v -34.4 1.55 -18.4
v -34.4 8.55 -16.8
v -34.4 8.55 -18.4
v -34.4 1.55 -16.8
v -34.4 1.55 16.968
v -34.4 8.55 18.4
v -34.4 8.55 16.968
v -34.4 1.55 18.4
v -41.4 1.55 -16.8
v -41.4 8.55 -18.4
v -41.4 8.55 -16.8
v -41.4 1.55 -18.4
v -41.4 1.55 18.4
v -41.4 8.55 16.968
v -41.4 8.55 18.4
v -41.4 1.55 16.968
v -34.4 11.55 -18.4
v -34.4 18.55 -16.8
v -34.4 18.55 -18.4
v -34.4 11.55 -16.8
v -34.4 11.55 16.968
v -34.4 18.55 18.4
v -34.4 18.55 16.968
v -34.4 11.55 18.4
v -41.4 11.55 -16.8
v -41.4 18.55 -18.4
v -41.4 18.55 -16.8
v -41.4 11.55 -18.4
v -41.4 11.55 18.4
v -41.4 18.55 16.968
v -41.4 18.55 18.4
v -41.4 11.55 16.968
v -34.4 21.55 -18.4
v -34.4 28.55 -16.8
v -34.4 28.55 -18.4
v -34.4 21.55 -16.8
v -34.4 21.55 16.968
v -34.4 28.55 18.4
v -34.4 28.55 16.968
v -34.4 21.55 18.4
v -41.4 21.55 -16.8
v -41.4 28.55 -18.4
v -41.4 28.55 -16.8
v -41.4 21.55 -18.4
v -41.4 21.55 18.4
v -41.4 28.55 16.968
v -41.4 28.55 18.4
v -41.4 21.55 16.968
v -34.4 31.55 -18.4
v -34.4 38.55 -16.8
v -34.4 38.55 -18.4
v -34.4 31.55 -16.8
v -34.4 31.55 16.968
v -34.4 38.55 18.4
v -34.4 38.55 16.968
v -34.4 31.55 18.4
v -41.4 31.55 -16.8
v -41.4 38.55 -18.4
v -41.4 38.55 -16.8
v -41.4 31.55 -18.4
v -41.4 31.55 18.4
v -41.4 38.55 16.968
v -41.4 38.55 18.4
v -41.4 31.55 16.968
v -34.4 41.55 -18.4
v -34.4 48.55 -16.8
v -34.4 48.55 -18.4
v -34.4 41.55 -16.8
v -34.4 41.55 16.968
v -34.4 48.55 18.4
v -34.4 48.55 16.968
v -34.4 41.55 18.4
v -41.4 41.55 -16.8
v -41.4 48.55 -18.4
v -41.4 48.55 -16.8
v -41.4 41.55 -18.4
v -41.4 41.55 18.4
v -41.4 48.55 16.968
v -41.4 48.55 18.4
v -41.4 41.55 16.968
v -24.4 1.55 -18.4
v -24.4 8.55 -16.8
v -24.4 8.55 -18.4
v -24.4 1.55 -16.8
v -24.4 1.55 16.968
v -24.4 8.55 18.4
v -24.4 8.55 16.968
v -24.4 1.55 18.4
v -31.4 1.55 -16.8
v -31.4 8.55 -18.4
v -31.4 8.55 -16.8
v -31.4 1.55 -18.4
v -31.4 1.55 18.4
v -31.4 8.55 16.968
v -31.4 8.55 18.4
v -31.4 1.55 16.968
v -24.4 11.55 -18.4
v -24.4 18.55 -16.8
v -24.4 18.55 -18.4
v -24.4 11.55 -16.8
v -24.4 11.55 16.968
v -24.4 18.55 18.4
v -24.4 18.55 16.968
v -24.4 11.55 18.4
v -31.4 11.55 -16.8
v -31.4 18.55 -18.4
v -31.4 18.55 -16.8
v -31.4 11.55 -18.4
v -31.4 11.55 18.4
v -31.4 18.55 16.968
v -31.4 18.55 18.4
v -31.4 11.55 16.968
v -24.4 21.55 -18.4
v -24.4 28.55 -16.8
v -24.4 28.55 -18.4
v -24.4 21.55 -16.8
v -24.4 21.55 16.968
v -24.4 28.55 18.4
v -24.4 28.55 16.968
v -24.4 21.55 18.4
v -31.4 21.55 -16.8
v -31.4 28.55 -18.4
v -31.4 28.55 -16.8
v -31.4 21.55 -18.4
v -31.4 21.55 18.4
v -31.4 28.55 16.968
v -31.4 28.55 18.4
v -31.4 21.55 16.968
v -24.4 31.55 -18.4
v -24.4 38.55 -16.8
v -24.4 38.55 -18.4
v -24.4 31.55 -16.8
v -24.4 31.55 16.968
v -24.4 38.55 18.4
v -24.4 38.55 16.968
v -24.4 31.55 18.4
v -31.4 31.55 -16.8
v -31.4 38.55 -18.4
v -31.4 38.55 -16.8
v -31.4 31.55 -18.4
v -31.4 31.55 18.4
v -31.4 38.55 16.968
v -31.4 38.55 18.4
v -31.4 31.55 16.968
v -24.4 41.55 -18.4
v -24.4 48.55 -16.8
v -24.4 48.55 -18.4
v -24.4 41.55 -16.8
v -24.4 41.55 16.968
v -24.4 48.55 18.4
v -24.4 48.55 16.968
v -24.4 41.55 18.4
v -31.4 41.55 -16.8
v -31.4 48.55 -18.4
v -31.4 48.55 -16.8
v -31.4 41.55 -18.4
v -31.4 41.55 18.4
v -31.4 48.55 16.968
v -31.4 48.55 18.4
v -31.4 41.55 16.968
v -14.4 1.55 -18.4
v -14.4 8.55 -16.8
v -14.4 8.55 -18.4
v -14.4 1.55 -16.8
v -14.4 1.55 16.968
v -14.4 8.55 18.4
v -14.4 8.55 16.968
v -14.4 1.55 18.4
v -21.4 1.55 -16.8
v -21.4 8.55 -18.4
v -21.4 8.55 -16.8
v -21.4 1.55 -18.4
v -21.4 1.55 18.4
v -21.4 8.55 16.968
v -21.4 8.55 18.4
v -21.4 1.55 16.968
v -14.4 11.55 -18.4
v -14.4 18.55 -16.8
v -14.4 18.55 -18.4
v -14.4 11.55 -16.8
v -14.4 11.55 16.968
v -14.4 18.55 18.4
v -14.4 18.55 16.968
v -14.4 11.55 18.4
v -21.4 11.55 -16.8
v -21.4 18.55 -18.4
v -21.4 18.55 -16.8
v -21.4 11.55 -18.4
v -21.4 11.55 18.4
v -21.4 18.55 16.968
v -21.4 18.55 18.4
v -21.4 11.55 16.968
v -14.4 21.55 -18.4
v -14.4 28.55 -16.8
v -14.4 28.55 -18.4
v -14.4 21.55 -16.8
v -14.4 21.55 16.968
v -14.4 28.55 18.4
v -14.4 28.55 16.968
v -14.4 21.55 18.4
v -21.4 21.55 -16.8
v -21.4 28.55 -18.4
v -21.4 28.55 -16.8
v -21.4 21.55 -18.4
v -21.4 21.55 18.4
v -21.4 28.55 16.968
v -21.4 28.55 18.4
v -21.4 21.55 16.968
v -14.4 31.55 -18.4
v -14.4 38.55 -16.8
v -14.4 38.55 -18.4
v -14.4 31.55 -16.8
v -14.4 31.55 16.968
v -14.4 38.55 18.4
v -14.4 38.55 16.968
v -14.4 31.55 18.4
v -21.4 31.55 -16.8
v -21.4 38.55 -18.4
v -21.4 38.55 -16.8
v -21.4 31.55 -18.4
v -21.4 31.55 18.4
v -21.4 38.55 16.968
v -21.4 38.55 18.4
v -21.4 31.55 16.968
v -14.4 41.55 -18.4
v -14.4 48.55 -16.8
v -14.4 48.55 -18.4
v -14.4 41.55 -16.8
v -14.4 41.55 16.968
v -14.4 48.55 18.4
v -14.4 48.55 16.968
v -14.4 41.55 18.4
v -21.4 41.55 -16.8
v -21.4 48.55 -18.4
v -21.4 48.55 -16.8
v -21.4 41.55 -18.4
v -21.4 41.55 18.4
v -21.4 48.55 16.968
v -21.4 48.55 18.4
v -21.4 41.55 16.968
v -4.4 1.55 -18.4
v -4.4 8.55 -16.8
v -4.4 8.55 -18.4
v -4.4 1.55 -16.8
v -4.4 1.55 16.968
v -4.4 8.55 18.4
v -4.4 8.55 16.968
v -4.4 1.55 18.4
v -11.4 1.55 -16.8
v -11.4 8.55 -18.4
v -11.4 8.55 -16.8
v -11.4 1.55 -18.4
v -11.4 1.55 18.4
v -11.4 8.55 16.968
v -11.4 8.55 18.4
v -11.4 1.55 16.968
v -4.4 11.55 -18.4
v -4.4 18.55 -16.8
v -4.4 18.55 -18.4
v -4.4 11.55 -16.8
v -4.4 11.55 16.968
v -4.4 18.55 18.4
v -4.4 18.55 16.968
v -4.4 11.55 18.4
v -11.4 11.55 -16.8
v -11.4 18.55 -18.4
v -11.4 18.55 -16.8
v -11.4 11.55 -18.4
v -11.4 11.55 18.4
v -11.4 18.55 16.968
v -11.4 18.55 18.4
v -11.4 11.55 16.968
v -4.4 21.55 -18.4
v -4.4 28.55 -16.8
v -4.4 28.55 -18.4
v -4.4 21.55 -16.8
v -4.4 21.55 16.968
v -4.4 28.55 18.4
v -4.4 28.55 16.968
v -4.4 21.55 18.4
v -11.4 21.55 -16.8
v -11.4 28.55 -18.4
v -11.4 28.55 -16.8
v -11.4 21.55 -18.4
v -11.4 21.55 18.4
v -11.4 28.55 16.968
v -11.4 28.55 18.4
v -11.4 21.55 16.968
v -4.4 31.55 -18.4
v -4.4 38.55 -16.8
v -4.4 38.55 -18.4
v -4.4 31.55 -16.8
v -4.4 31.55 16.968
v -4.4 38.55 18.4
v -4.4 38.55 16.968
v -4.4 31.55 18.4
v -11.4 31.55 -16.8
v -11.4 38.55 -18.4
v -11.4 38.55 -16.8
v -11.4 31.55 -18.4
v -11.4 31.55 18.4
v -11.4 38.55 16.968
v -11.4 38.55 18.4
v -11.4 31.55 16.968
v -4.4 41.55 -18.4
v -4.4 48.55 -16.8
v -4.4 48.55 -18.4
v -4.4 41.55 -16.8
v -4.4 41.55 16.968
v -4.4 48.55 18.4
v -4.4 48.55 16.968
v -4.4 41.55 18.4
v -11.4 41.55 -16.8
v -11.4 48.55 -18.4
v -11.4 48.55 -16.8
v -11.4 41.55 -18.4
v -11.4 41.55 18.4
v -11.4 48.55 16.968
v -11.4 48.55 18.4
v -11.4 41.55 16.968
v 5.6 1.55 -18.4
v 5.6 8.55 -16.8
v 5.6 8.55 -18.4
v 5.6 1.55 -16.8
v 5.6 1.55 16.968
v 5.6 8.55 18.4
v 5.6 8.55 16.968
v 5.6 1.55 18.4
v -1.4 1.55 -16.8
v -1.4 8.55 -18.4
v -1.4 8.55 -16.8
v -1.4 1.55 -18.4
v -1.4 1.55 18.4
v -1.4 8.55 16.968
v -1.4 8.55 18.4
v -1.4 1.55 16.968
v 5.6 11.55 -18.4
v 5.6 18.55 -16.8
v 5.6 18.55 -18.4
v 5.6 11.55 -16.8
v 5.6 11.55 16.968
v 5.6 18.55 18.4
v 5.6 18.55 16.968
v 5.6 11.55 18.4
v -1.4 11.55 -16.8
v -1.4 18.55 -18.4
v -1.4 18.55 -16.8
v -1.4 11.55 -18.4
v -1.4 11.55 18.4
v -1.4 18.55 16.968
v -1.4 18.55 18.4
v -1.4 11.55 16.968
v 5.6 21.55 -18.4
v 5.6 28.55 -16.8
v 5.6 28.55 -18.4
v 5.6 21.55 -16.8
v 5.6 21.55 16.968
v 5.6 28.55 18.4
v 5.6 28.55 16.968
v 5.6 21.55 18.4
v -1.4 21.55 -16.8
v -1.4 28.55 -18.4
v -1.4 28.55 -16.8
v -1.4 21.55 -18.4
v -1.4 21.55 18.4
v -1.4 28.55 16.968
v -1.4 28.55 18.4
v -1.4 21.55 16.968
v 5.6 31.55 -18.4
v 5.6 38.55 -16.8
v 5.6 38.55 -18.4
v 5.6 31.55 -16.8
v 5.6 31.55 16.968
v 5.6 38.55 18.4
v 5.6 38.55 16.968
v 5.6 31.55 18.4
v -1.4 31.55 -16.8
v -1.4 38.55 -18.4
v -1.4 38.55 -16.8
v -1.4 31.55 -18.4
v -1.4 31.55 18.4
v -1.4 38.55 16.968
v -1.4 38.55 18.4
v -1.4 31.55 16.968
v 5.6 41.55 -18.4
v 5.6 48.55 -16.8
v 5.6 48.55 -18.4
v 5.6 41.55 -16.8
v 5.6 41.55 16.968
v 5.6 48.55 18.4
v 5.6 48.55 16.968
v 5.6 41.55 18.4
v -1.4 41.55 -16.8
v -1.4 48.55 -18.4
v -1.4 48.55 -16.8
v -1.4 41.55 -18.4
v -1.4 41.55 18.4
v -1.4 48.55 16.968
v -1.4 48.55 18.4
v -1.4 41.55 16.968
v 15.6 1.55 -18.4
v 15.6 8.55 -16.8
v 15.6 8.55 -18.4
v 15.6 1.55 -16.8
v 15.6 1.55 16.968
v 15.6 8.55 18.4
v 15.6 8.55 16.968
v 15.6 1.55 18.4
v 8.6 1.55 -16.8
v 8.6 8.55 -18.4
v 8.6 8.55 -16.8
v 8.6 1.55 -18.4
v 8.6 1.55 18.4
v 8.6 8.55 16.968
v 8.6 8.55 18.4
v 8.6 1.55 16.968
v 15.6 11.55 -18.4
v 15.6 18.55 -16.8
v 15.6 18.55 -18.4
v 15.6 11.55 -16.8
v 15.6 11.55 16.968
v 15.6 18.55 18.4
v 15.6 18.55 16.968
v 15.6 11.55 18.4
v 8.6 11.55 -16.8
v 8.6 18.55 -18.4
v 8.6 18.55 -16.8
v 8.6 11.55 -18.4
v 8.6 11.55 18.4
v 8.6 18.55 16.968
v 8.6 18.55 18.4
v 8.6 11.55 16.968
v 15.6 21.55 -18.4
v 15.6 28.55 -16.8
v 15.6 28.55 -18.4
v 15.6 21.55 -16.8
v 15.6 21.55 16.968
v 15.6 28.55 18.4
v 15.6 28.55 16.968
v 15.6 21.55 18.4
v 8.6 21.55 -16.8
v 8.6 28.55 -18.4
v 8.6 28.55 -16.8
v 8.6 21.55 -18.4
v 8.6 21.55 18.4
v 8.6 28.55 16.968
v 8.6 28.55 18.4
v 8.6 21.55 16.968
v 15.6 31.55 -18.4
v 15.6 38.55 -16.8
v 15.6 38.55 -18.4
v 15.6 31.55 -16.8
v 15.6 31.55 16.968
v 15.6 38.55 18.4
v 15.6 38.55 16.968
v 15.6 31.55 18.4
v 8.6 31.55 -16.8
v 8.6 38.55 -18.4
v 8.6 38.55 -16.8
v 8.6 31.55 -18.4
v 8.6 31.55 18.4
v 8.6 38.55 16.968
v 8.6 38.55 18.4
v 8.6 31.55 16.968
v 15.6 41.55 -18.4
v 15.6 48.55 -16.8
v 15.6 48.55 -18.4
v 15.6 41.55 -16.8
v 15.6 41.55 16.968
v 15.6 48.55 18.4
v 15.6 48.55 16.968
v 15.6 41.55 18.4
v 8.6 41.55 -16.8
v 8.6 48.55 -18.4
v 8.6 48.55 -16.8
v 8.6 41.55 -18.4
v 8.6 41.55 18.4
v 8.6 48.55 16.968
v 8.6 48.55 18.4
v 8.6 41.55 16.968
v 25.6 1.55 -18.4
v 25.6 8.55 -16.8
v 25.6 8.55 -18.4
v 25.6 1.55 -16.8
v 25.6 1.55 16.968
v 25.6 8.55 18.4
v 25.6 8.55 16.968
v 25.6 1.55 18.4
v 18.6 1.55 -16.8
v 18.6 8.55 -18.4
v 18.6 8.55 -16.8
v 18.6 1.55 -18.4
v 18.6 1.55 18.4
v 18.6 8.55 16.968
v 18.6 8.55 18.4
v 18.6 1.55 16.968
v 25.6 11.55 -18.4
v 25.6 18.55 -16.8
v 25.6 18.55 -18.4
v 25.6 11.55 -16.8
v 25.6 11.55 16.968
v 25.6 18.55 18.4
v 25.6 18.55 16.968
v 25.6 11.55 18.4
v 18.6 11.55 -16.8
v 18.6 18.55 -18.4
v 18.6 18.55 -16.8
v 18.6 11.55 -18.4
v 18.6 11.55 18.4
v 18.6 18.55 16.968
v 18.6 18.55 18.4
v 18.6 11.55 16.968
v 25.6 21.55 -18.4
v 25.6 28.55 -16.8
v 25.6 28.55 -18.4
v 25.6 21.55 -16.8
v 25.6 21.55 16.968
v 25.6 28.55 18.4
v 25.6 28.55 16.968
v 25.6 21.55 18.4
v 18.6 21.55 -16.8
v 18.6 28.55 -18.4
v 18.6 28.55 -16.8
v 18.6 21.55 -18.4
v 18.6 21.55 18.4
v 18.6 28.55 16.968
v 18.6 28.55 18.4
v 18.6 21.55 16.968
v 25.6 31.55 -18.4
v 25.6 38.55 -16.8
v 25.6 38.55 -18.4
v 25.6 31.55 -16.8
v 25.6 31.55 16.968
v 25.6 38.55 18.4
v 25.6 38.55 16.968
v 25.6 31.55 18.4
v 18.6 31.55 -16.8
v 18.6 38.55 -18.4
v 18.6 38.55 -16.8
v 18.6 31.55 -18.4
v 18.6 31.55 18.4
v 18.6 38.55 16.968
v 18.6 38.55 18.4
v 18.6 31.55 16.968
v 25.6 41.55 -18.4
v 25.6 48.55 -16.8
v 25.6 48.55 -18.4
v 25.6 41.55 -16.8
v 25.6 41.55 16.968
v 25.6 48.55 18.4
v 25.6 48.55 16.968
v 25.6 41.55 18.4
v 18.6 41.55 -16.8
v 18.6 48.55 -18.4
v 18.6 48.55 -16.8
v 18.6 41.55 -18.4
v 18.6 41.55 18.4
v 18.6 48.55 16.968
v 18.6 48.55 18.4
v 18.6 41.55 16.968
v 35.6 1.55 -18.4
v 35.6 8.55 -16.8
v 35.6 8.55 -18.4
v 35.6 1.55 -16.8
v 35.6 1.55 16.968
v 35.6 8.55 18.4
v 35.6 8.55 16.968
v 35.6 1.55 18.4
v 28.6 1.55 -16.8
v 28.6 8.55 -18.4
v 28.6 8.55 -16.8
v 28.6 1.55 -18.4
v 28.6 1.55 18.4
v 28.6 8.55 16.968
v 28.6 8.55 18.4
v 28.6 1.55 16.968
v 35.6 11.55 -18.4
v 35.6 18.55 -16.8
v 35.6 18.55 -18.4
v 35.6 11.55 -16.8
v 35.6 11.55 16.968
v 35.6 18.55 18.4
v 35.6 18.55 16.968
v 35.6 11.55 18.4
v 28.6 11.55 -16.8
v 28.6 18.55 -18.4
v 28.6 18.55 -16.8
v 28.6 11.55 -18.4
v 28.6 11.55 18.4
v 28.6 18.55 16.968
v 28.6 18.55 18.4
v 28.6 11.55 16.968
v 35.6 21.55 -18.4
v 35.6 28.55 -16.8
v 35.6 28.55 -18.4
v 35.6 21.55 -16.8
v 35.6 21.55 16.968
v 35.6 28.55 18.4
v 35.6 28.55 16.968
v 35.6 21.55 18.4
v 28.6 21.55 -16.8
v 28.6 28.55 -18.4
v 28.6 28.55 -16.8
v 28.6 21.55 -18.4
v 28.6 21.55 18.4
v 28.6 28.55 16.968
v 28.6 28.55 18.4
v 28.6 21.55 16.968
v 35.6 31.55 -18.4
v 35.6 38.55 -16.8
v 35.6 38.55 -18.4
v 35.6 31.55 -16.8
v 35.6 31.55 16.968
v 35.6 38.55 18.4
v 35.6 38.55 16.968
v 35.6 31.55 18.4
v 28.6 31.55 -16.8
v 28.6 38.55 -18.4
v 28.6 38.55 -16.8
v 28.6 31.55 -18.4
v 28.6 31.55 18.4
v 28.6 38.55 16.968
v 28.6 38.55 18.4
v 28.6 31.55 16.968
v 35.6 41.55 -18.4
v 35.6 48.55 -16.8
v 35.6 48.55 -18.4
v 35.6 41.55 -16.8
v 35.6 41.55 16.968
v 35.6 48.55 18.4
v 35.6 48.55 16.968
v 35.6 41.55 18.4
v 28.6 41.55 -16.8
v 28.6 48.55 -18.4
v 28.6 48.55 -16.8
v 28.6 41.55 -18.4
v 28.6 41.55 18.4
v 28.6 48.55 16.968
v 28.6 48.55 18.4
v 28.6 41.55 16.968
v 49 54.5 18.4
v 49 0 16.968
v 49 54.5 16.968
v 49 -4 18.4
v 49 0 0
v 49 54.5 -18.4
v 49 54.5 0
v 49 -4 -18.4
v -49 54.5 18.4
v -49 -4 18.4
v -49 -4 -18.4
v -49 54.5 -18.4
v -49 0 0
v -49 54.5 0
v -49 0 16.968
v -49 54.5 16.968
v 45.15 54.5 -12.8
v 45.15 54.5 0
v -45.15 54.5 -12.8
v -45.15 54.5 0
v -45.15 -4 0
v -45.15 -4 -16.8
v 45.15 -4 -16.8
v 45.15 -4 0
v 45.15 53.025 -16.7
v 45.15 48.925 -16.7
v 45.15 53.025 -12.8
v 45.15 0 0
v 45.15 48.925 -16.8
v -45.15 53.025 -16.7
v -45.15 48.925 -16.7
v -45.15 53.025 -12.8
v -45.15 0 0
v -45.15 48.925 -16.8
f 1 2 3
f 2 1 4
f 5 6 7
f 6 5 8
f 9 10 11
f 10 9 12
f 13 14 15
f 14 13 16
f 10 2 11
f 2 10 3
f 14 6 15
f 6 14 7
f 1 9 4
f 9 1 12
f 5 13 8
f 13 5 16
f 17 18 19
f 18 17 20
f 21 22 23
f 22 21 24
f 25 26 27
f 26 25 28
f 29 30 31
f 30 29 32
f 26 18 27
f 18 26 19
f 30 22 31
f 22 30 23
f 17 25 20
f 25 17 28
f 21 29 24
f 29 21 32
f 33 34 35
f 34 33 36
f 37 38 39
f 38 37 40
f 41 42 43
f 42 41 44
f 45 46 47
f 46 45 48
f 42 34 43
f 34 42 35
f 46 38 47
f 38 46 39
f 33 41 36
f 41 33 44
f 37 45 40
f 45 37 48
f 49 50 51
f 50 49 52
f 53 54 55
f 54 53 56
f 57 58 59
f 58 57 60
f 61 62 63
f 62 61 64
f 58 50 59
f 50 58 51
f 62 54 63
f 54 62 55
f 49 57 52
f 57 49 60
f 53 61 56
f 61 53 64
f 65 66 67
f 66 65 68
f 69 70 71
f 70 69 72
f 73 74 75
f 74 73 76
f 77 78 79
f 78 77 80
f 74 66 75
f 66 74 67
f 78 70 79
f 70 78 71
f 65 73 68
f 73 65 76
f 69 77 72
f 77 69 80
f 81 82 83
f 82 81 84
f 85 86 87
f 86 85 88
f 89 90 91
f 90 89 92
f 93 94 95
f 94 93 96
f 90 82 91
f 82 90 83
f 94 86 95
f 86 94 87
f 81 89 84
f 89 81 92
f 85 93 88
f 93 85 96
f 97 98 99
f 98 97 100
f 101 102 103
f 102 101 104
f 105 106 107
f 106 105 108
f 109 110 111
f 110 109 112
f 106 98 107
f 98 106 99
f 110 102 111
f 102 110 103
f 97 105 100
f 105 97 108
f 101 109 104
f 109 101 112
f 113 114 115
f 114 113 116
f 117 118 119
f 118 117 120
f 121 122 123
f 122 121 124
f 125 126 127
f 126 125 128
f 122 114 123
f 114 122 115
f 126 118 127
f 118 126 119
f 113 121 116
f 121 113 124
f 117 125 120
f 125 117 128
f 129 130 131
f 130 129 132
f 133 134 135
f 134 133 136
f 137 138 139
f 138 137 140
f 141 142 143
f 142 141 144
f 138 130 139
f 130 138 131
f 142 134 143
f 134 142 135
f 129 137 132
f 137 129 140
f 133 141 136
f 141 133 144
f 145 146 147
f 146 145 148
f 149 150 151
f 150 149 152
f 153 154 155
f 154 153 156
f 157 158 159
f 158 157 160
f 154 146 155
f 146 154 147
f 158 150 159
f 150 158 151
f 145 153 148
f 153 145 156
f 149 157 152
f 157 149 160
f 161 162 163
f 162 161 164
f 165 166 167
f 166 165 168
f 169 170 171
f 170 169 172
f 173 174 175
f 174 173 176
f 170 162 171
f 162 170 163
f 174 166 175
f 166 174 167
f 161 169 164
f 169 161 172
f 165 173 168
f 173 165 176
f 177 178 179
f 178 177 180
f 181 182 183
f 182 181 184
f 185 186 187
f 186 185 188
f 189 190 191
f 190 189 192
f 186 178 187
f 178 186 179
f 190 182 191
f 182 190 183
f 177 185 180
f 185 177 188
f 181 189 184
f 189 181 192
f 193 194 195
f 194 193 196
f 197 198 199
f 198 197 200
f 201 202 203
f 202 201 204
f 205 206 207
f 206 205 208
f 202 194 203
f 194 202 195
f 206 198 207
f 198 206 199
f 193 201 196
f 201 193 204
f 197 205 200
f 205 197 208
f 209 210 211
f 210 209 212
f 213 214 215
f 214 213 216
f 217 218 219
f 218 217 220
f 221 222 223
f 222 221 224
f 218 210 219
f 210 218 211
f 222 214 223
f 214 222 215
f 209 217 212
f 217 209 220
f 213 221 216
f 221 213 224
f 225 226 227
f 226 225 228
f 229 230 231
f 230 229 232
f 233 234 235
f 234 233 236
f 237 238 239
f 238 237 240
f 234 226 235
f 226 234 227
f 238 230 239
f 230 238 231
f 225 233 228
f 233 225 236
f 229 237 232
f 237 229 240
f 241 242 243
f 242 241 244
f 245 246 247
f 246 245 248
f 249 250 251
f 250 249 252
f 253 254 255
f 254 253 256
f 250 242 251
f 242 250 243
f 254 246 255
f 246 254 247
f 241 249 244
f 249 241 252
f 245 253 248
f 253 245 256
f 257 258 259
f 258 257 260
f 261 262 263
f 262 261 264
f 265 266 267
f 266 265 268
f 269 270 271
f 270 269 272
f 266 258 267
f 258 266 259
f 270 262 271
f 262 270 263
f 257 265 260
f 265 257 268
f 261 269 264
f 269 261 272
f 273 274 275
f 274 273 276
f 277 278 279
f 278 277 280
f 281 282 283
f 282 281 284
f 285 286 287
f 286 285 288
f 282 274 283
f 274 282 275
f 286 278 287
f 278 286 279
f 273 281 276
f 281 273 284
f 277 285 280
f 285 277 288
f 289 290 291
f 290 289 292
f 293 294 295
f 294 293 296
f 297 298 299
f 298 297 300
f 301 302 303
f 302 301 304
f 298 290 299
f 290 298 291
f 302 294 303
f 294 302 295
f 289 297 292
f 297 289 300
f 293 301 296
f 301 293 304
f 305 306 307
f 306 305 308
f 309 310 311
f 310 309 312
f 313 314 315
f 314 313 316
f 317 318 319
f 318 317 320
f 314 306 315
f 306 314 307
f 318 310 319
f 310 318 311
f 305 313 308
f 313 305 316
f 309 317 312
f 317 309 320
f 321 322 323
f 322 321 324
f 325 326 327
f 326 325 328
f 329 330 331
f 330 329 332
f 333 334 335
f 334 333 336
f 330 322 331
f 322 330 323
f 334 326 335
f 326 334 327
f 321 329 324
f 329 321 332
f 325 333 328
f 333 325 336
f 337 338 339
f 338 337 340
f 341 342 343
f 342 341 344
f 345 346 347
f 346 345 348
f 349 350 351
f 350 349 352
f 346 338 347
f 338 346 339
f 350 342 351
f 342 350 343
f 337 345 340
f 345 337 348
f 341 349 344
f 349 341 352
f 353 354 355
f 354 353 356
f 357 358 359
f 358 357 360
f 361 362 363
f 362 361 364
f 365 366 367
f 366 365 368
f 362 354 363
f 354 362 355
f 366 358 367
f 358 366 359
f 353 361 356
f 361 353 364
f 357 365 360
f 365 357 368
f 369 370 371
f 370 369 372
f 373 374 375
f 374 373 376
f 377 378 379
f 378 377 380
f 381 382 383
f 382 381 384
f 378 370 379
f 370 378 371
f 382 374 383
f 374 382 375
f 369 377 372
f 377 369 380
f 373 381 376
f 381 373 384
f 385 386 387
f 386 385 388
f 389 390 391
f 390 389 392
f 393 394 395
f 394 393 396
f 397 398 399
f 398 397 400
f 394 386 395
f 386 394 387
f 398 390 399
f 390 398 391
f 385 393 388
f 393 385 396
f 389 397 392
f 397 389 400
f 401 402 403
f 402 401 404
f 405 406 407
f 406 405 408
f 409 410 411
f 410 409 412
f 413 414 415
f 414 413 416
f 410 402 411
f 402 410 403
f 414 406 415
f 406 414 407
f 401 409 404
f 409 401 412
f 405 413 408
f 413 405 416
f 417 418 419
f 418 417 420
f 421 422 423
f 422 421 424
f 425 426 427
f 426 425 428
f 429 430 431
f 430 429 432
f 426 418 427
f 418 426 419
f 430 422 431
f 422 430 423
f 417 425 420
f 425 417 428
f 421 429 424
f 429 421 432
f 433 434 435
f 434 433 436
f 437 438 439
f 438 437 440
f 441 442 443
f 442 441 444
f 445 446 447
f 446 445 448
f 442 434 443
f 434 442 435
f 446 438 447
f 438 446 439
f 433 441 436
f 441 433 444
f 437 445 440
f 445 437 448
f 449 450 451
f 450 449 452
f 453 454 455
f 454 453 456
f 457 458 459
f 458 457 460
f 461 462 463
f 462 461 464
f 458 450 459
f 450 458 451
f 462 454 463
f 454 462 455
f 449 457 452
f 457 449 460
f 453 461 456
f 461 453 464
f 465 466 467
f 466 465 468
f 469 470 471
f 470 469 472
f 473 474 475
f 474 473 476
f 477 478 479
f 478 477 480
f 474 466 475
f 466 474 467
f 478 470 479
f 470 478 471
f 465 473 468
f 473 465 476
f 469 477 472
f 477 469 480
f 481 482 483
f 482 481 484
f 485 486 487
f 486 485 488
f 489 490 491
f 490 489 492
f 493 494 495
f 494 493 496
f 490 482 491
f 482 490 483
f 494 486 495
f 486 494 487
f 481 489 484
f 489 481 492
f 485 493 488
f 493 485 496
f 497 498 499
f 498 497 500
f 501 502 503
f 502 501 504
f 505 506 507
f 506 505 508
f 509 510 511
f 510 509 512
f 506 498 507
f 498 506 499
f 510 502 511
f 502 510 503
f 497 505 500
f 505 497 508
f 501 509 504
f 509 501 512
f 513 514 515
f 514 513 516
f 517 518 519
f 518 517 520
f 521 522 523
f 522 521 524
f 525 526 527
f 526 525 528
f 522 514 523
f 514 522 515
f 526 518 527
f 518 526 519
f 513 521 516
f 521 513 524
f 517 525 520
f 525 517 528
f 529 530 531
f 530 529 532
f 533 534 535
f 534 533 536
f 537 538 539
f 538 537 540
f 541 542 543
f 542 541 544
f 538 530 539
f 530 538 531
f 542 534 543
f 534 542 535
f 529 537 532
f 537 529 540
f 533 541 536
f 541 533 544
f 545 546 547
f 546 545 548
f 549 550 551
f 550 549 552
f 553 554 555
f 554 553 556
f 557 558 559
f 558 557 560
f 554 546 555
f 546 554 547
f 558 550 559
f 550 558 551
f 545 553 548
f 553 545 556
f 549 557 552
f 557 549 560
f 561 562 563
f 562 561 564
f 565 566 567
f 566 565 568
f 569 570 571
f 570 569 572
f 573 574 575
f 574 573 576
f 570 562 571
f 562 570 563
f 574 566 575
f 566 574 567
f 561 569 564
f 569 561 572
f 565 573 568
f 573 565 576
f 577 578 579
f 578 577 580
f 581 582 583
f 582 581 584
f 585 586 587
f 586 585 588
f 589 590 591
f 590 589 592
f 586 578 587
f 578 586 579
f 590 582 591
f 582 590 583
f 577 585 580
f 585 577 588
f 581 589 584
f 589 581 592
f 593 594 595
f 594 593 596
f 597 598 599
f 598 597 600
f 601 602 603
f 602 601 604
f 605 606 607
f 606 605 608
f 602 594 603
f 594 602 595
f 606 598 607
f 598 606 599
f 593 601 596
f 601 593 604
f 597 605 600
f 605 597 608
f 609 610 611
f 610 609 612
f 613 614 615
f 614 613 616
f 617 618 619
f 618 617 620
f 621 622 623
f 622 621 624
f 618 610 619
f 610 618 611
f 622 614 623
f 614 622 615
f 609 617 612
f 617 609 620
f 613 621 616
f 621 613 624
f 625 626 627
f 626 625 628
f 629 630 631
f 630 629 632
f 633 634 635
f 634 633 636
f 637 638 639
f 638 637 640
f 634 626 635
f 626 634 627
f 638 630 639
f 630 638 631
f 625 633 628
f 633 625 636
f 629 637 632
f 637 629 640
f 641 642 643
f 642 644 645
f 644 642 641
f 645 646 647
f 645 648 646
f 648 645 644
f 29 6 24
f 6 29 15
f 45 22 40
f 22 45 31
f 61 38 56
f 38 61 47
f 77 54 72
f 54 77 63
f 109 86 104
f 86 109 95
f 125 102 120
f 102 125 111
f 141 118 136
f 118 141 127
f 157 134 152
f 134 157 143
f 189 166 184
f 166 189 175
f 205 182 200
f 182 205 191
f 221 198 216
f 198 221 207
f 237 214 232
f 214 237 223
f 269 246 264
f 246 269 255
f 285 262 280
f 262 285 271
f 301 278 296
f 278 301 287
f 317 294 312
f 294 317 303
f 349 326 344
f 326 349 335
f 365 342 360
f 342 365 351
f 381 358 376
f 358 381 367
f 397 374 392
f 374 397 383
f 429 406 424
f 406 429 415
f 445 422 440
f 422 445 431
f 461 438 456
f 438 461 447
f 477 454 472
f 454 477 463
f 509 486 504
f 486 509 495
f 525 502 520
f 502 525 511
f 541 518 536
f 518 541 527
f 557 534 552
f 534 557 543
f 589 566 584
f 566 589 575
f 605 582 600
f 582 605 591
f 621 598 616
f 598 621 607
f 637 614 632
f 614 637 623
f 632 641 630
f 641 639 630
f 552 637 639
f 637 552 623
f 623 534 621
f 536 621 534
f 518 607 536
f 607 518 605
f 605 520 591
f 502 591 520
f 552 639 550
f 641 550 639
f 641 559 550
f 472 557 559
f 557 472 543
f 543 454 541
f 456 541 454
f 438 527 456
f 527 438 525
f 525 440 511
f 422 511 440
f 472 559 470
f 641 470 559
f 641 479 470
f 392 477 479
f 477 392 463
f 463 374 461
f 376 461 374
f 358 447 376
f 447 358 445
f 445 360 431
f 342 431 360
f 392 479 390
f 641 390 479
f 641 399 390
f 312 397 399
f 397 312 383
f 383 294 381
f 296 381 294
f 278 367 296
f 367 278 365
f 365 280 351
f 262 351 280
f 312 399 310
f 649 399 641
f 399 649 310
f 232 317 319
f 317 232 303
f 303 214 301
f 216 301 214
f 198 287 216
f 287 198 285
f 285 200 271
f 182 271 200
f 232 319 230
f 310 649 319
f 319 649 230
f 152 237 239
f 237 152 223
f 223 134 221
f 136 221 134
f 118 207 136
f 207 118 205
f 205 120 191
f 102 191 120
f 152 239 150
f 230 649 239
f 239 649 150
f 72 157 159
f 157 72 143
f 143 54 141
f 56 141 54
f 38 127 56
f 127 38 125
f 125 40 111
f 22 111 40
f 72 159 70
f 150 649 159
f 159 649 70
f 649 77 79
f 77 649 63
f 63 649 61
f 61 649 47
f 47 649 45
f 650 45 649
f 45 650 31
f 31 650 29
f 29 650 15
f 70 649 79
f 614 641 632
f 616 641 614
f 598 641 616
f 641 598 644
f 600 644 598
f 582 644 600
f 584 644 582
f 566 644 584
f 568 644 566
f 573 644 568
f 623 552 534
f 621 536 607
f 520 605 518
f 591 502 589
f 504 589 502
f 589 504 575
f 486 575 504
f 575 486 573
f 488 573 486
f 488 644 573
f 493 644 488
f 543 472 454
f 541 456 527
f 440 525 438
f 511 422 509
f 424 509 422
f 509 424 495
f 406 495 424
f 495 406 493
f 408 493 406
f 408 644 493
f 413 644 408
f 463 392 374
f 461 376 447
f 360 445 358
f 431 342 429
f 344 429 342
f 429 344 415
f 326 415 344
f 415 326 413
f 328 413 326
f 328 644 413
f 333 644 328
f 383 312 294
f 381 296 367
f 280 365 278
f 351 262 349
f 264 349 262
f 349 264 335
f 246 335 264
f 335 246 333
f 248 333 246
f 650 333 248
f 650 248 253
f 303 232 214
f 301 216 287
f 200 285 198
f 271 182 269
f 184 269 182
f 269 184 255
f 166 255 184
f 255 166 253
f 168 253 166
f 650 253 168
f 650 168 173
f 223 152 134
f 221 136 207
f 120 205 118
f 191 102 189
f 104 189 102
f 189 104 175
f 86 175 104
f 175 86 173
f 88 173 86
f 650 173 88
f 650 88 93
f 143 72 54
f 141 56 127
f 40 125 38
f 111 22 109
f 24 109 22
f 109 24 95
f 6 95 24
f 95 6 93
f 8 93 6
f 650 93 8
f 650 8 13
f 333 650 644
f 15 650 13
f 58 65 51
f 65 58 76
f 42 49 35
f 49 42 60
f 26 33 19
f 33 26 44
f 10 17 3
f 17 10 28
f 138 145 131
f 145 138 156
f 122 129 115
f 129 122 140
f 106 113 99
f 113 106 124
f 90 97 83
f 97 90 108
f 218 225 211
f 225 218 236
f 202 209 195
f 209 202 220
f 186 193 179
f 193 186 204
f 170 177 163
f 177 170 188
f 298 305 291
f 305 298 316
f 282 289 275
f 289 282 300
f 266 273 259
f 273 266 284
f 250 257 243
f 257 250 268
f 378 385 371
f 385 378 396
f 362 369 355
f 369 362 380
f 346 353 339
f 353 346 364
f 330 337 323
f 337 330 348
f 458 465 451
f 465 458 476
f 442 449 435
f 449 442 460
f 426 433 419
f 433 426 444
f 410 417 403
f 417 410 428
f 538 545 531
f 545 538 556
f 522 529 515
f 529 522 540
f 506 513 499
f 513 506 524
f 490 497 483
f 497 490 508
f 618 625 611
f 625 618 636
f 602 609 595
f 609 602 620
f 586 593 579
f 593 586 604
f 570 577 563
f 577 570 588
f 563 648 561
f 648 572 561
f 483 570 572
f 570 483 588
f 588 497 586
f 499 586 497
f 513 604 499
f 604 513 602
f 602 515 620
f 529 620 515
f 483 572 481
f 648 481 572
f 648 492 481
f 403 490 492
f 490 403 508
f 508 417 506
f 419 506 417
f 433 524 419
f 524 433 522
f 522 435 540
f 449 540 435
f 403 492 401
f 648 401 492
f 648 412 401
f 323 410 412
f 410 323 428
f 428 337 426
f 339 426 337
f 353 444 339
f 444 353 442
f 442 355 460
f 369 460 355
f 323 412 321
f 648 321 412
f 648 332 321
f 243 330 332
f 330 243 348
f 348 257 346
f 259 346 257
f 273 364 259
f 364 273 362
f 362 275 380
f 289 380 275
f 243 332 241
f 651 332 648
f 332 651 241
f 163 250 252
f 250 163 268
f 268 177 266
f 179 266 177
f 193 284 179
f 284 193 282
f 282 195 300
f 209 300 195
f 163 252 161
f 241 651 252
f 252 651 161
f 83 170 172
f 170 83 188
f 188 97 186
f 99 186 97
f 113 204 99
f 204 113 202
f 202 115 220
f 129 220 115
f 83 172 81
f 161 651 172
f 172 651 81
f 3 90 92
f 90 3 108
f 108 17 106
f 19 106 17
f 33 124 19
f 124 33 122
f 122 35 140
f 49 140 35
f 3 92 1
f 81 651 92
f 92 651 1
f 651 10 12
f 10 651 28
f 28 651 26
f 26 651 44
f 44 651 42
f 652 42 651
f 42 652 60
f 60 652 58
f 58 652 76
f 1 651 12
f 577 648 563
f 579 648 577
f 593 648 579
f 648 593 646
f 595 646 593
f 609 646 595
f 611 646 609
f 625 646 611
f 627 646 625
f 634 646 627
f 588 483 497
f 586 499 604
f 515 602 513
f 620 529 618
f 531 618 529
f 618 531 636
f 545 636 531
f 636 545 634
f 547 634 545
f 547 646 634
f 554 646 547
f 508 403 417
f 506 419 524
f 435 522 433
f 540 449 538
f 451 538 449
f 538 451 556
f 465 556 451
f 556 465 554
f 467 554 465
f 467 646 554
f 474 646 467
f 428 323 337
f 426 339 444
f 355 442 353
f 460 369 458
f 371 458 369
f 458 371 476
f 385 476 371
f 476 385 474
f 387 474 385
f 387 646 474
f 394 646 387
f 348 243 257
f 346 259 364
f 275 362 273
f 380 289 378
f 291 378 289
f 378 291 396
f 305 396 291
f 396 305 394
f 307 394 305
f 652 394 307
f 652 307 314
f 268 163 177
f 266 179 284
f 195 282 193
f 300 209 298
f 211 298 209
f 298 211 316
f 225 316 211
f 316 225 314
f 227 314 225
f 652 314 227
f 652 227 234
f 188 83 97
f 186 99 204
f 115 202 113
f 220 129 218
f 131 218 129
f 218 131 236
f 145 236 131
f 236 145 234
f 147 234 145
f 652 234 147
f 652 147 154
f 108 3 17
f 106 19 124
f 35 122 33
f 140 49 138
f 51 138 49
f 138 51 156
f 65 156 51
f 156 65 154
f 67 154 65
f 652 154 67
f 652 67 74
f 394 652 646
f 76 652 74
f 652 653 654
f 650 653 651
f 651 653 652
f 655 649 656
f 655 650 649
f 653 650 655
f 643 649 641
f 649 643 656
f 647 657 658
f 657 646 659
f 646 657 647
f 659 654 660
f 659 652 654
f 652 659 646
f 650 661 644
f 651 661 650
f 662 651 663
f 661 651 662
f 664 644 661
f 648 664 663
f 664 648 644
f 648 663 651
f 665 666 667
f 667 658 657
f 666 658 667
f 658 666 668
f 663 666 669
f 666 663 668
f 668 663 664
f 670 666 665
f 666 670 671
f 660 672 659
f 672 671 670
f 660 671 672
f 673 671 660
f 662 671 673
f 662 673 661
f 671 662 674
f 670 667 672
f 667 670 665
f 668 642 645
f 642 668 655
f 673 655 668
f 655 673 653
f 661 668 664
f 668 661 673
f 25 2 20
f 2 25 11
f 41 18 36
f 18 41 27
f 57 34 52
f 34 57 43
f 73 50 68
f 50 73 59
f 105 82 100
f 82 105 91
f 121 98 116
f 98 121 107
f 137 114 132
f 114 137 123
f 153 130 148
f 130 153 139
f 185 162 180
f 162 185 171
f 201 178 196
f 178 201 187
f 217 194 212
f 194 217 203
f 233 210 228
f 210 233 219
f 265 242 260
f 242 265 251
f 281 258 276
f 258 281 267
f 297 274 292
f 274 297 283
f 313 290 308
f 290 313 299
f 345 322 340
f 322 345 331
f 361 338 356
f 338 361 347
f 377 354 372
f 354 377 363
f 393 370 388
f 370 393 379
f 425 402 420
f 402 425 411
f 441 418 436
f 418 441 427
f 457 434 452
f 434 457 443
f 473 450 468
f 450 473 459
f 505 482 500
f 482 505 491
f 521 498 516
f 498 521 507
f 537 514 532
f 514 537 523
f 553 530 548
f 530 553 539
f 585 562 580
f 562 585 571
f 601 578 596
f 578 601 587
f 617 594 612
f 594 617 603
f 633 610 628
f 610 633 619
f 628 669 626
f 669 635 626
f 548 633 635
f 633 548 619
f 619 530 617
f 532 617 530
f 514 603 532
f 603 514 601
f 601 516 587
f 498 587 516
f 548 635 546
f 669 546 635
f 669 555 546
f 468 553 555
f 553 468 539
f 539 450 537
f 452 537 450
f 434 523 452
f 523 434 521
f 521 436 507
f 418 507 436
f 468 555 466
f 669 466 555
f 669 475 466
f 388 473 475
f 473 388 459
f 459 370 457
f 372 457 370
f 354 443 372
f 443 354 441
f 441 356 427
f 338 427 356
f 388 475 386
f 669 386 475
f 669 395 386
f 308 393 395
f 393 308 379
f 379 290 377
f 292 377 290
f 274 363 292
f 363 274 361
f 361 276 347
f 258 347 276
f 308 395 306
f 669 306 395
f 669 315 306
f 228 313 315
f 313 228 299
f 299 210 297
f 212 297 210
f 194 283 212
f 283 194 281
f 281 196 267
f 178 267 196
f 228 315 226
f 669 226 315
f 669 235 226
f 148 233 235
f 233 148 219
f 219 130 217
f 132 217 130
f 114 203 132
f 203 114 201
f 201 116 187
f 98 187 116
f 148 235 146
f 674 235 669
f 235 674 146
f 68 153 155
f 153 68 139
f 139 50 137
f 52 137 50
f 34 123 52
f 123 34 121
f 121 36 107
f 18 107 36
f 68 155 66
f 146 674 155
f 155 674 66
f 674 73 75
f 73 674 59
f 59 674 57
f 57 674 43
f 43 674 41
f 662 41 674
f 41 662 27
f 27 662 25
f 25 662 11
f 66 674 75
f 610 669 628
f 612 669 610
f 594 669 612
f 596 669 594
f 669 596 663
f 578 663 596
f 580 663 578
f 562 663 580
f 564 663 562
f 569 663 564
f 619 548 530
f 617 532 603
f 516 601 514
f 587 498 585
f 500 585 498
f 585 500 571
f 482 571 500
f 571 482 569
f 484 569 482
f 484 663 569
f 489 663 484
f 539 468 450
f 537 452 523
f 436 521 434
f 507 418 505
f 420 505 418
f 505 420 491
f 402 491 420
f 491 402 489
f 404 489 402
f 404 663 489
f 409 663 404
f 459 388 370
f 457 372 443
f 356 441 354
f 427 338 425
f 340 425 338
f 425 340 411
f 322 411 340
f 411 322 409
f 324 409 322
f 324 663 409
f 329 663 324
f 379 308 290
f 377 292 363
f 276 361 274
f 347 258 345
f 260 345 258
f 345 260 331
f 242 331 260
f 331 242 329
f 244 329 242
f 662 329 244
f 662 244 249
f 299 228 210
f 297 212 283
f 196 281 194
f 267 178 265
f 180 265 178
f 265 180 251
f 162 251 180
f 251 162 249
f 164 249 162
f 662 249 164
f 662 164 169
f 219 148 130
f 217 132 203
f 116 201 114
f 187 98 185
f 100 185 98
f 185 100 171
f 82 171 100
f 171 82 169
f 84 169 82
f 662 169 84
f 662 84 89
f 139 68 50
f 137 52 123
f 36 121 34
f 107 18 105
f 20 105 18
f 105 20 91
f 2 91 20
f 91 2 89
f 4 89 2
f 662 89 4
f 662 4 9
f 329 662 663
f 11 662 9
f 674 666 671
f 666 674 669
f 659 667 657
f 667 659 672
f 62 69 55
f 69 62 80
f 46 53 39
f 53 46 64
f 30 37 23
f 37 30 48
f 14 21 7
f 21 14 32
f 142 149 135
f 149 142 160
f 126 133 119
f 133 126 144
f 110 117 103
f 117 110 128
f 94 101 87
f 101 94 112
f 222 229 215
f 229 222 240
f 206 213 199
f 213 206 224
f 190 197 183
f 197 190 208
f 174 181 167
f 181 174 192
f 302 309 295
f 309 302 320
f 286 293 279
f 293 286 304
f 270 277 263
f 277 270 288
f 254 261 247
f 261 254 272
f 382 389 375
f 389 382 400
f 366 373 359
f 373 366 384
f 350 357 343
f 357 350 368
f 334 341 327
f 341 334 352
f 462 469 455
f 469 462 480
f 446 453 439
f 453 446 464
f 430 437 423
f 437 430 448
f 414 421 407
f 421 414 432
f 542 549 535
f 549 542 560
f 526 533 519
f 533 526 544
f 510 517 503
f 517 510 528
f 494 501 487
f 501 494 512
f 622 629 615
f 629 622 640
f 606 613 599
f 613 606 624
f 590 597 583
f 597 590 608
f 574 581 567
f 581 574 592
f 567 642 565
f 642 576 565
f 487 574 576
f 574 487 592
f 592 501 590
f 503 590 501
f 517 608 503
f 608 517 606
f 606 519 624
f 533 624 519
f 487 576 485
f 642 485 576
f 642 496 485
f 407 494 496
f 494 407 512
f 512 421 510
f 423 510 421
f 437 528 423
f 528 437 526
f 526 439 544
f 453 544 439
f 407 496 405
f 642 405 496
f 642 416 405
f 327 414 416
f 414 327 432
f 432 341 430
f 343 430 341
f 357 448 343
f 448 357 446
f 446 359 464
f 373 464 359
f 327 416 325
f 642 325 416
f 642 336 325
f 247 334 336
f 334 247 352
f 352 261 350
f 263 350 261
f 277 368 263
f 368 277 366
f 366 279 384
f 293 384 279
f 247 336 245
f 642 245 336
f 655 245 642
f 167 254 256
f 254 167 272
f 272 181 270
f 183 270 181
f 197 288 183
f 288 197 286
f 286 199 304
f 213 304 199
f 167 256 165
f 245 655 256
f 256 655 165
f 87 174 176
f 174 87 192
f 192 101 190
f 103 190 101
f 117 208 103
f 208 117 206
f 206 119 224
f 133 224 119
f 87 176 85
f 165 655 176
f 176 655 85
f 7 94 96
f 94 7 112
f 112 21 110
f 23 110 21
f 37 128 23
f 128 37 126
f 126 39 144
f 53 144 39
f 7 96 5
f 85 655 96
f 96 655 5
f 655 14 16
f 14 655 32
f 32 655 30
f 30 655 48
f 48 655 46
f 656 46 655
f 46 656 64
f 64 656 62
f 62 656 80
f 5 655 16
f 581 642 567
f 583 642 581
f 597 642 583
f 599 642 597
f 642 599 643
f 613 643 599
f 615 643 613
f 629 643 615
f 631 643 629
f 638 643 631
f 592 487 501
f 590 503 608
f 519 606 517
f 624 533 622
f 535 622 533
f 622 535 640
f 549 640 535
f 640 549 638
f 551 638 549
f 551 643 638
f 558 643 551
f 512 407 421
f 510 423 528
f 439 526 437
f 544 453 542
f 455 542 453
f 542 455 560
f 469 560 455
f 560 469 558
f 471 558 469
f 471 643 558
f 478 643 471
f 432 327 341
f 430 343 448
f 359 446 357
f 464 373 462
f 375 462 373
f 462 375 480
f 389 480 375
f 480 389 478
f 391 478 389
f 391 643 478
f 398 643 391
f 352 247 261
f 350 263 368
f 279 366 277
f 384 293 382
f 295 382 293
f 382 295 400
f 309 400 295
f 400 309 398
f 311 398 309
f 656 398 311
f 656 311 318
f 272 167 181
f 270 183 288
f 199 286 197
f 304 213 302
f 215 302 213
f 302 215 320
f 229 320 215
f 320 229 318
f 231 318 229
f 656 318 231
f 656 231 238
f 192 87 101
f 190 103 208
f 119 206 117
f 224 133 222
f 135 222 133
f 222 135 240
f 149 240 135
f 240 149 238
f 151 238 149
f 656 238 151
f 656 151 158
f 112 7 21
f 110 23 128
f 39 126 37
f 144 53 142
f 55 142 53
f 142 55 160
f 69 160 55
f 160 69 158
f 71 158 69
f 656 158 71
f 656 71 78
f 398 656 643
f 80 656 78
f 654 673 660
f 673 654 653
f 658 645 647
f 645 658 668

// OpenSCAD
// Height of the Card Reader
Card_Reader_Height = 16;

// Width of the Card Reader
Card_Reader_Width = 86;

// Depth of the Card Reader
Card_Reader_Depth = 50.5;

// Thickness of the Table
Table_Thickness = 16.8;

// How thick should the bracket be
Bracket_Thickness = 2;

// How much wider than the card reader should the bracket be
Bracket_Extra_Width = 6;

// How much deeper than the card reader should the bracket be
Bracket_Extra_Depth = 4;

module CardReaderHolder(
    crHeight=Card_Reader_Height,
    crWidth=Card_Reader_Width,
    crDepth=Card_Reader_Depth,
    tableThickness = Table_Thickness,
    bracketThickness = Bracket_Thickness,
    bracketExtraWidth = Bracket_Extra_Width,
    bracketExtraDepth = Bracket_Extra_Depth) 
{
    module CardReader() {
        translate([0, crDepth/2, -crHeight/2]) cube([crWidth, crDepth, crHeight],center=true);
    }

    module Table() {
        tDepth = crDepth * 10;
        translate([0,tDepth/2,tableThickness/2]) cube([crWidth*10,tDepth,tableThickness], center=true);

    }

    module BaseCube() {
        bcDepth = crDepth+(2*bracketExtraDepth);
        translate([0, bcDepth/2 - bracketExtraDepth, 0]) cube([
            crWidth+(2*bracketExtraWidth),
            bcDepth,
            crHeight + tableThickness + (2 * bracketThickness)],
            center = true);
    }
    
    module LargeFlatPart() {
        cube([
        crWidth + 2*bracketExtraWidth,
        crDepth + 2*bracketExtraDepth,
        bracketThickness], center=true);
    }

    module AngleBeam(size=1, height=2, center=true) {
        s2 = size/2;
        linear_extrude(height=height, center=center, convexity=1)
            polygon(
                points=[[-s2,-s2],[s2,-s2],[s2,s2],[0,s2],[0,0],[-s2,0]],
                paths=[[0,1,2,3,4,5,6,0]],
                convexity=2);
    }
    
    module HorizontalHoles() {
        w = (crWidth/2) * 0.8;
        d = (crDepth/2) * 0.8;
        size = 7;
        for (x=[-w-size/2:10:w+size/2]) {
            for (y=[-d-size/2:10:d+size/2]) {
                translate([0,crDepth/2+size/2,0])
                translate([x,y,0]) cube([size, size,100],center=true);
            }
        }
    }
    
    /*
    extendedWidth = crWidth + (8*bracketThickness);
    extendedDepth = crDepth + (3*bracketThickness);
    translate([0,0,-(crHeight/2)-(bracketThickness/2)]) LargeFlatPart();
    translate([0,0,(crHeight/2)+(bracketThickness/2)+tableThickness]) LargeFlatPart();
    %color([0.6, 0.8, 1, 0.5]) CardReader();
    %color([0.5,0.5,0.5,0.3]) Table();
    translate([-crWidth/2-bracketExtraWidth,-crDepth/2-bracketExtraDepth,crHeight/2]) AngleBeam(size=3, height=crHeight+tableThickness + 2*bracketThickness);
    translate([crWidth/2+bracketExtraWidth,-crDepth/2-bracketExtraDepth,crHeight/2]) AngleBeam(size=3, height=crHeight+tableThickness + 2*bracketThickness);
    
    */
    
    
    difference() {
        BaseCube();
        translate([0,0,+0.1]) 
            scale([1.05, 1.05, 1.05]) CardReader();
        translate([0,-bracketExtraDepth-0.1,0]) 
            scale([1.05, 1.05, 1.05]) CardReader();
        translate([0,+bracketExtraDepth+0.1,2*bracketThickness]) 
            scale([1.05, 1.05, 1.05]) CardReader();
        translate([0,0,0]) 
            scale([1, 1, 1.01]) Table();
        HorizontalHoles();
    }
}   

CardReaderHolder();
